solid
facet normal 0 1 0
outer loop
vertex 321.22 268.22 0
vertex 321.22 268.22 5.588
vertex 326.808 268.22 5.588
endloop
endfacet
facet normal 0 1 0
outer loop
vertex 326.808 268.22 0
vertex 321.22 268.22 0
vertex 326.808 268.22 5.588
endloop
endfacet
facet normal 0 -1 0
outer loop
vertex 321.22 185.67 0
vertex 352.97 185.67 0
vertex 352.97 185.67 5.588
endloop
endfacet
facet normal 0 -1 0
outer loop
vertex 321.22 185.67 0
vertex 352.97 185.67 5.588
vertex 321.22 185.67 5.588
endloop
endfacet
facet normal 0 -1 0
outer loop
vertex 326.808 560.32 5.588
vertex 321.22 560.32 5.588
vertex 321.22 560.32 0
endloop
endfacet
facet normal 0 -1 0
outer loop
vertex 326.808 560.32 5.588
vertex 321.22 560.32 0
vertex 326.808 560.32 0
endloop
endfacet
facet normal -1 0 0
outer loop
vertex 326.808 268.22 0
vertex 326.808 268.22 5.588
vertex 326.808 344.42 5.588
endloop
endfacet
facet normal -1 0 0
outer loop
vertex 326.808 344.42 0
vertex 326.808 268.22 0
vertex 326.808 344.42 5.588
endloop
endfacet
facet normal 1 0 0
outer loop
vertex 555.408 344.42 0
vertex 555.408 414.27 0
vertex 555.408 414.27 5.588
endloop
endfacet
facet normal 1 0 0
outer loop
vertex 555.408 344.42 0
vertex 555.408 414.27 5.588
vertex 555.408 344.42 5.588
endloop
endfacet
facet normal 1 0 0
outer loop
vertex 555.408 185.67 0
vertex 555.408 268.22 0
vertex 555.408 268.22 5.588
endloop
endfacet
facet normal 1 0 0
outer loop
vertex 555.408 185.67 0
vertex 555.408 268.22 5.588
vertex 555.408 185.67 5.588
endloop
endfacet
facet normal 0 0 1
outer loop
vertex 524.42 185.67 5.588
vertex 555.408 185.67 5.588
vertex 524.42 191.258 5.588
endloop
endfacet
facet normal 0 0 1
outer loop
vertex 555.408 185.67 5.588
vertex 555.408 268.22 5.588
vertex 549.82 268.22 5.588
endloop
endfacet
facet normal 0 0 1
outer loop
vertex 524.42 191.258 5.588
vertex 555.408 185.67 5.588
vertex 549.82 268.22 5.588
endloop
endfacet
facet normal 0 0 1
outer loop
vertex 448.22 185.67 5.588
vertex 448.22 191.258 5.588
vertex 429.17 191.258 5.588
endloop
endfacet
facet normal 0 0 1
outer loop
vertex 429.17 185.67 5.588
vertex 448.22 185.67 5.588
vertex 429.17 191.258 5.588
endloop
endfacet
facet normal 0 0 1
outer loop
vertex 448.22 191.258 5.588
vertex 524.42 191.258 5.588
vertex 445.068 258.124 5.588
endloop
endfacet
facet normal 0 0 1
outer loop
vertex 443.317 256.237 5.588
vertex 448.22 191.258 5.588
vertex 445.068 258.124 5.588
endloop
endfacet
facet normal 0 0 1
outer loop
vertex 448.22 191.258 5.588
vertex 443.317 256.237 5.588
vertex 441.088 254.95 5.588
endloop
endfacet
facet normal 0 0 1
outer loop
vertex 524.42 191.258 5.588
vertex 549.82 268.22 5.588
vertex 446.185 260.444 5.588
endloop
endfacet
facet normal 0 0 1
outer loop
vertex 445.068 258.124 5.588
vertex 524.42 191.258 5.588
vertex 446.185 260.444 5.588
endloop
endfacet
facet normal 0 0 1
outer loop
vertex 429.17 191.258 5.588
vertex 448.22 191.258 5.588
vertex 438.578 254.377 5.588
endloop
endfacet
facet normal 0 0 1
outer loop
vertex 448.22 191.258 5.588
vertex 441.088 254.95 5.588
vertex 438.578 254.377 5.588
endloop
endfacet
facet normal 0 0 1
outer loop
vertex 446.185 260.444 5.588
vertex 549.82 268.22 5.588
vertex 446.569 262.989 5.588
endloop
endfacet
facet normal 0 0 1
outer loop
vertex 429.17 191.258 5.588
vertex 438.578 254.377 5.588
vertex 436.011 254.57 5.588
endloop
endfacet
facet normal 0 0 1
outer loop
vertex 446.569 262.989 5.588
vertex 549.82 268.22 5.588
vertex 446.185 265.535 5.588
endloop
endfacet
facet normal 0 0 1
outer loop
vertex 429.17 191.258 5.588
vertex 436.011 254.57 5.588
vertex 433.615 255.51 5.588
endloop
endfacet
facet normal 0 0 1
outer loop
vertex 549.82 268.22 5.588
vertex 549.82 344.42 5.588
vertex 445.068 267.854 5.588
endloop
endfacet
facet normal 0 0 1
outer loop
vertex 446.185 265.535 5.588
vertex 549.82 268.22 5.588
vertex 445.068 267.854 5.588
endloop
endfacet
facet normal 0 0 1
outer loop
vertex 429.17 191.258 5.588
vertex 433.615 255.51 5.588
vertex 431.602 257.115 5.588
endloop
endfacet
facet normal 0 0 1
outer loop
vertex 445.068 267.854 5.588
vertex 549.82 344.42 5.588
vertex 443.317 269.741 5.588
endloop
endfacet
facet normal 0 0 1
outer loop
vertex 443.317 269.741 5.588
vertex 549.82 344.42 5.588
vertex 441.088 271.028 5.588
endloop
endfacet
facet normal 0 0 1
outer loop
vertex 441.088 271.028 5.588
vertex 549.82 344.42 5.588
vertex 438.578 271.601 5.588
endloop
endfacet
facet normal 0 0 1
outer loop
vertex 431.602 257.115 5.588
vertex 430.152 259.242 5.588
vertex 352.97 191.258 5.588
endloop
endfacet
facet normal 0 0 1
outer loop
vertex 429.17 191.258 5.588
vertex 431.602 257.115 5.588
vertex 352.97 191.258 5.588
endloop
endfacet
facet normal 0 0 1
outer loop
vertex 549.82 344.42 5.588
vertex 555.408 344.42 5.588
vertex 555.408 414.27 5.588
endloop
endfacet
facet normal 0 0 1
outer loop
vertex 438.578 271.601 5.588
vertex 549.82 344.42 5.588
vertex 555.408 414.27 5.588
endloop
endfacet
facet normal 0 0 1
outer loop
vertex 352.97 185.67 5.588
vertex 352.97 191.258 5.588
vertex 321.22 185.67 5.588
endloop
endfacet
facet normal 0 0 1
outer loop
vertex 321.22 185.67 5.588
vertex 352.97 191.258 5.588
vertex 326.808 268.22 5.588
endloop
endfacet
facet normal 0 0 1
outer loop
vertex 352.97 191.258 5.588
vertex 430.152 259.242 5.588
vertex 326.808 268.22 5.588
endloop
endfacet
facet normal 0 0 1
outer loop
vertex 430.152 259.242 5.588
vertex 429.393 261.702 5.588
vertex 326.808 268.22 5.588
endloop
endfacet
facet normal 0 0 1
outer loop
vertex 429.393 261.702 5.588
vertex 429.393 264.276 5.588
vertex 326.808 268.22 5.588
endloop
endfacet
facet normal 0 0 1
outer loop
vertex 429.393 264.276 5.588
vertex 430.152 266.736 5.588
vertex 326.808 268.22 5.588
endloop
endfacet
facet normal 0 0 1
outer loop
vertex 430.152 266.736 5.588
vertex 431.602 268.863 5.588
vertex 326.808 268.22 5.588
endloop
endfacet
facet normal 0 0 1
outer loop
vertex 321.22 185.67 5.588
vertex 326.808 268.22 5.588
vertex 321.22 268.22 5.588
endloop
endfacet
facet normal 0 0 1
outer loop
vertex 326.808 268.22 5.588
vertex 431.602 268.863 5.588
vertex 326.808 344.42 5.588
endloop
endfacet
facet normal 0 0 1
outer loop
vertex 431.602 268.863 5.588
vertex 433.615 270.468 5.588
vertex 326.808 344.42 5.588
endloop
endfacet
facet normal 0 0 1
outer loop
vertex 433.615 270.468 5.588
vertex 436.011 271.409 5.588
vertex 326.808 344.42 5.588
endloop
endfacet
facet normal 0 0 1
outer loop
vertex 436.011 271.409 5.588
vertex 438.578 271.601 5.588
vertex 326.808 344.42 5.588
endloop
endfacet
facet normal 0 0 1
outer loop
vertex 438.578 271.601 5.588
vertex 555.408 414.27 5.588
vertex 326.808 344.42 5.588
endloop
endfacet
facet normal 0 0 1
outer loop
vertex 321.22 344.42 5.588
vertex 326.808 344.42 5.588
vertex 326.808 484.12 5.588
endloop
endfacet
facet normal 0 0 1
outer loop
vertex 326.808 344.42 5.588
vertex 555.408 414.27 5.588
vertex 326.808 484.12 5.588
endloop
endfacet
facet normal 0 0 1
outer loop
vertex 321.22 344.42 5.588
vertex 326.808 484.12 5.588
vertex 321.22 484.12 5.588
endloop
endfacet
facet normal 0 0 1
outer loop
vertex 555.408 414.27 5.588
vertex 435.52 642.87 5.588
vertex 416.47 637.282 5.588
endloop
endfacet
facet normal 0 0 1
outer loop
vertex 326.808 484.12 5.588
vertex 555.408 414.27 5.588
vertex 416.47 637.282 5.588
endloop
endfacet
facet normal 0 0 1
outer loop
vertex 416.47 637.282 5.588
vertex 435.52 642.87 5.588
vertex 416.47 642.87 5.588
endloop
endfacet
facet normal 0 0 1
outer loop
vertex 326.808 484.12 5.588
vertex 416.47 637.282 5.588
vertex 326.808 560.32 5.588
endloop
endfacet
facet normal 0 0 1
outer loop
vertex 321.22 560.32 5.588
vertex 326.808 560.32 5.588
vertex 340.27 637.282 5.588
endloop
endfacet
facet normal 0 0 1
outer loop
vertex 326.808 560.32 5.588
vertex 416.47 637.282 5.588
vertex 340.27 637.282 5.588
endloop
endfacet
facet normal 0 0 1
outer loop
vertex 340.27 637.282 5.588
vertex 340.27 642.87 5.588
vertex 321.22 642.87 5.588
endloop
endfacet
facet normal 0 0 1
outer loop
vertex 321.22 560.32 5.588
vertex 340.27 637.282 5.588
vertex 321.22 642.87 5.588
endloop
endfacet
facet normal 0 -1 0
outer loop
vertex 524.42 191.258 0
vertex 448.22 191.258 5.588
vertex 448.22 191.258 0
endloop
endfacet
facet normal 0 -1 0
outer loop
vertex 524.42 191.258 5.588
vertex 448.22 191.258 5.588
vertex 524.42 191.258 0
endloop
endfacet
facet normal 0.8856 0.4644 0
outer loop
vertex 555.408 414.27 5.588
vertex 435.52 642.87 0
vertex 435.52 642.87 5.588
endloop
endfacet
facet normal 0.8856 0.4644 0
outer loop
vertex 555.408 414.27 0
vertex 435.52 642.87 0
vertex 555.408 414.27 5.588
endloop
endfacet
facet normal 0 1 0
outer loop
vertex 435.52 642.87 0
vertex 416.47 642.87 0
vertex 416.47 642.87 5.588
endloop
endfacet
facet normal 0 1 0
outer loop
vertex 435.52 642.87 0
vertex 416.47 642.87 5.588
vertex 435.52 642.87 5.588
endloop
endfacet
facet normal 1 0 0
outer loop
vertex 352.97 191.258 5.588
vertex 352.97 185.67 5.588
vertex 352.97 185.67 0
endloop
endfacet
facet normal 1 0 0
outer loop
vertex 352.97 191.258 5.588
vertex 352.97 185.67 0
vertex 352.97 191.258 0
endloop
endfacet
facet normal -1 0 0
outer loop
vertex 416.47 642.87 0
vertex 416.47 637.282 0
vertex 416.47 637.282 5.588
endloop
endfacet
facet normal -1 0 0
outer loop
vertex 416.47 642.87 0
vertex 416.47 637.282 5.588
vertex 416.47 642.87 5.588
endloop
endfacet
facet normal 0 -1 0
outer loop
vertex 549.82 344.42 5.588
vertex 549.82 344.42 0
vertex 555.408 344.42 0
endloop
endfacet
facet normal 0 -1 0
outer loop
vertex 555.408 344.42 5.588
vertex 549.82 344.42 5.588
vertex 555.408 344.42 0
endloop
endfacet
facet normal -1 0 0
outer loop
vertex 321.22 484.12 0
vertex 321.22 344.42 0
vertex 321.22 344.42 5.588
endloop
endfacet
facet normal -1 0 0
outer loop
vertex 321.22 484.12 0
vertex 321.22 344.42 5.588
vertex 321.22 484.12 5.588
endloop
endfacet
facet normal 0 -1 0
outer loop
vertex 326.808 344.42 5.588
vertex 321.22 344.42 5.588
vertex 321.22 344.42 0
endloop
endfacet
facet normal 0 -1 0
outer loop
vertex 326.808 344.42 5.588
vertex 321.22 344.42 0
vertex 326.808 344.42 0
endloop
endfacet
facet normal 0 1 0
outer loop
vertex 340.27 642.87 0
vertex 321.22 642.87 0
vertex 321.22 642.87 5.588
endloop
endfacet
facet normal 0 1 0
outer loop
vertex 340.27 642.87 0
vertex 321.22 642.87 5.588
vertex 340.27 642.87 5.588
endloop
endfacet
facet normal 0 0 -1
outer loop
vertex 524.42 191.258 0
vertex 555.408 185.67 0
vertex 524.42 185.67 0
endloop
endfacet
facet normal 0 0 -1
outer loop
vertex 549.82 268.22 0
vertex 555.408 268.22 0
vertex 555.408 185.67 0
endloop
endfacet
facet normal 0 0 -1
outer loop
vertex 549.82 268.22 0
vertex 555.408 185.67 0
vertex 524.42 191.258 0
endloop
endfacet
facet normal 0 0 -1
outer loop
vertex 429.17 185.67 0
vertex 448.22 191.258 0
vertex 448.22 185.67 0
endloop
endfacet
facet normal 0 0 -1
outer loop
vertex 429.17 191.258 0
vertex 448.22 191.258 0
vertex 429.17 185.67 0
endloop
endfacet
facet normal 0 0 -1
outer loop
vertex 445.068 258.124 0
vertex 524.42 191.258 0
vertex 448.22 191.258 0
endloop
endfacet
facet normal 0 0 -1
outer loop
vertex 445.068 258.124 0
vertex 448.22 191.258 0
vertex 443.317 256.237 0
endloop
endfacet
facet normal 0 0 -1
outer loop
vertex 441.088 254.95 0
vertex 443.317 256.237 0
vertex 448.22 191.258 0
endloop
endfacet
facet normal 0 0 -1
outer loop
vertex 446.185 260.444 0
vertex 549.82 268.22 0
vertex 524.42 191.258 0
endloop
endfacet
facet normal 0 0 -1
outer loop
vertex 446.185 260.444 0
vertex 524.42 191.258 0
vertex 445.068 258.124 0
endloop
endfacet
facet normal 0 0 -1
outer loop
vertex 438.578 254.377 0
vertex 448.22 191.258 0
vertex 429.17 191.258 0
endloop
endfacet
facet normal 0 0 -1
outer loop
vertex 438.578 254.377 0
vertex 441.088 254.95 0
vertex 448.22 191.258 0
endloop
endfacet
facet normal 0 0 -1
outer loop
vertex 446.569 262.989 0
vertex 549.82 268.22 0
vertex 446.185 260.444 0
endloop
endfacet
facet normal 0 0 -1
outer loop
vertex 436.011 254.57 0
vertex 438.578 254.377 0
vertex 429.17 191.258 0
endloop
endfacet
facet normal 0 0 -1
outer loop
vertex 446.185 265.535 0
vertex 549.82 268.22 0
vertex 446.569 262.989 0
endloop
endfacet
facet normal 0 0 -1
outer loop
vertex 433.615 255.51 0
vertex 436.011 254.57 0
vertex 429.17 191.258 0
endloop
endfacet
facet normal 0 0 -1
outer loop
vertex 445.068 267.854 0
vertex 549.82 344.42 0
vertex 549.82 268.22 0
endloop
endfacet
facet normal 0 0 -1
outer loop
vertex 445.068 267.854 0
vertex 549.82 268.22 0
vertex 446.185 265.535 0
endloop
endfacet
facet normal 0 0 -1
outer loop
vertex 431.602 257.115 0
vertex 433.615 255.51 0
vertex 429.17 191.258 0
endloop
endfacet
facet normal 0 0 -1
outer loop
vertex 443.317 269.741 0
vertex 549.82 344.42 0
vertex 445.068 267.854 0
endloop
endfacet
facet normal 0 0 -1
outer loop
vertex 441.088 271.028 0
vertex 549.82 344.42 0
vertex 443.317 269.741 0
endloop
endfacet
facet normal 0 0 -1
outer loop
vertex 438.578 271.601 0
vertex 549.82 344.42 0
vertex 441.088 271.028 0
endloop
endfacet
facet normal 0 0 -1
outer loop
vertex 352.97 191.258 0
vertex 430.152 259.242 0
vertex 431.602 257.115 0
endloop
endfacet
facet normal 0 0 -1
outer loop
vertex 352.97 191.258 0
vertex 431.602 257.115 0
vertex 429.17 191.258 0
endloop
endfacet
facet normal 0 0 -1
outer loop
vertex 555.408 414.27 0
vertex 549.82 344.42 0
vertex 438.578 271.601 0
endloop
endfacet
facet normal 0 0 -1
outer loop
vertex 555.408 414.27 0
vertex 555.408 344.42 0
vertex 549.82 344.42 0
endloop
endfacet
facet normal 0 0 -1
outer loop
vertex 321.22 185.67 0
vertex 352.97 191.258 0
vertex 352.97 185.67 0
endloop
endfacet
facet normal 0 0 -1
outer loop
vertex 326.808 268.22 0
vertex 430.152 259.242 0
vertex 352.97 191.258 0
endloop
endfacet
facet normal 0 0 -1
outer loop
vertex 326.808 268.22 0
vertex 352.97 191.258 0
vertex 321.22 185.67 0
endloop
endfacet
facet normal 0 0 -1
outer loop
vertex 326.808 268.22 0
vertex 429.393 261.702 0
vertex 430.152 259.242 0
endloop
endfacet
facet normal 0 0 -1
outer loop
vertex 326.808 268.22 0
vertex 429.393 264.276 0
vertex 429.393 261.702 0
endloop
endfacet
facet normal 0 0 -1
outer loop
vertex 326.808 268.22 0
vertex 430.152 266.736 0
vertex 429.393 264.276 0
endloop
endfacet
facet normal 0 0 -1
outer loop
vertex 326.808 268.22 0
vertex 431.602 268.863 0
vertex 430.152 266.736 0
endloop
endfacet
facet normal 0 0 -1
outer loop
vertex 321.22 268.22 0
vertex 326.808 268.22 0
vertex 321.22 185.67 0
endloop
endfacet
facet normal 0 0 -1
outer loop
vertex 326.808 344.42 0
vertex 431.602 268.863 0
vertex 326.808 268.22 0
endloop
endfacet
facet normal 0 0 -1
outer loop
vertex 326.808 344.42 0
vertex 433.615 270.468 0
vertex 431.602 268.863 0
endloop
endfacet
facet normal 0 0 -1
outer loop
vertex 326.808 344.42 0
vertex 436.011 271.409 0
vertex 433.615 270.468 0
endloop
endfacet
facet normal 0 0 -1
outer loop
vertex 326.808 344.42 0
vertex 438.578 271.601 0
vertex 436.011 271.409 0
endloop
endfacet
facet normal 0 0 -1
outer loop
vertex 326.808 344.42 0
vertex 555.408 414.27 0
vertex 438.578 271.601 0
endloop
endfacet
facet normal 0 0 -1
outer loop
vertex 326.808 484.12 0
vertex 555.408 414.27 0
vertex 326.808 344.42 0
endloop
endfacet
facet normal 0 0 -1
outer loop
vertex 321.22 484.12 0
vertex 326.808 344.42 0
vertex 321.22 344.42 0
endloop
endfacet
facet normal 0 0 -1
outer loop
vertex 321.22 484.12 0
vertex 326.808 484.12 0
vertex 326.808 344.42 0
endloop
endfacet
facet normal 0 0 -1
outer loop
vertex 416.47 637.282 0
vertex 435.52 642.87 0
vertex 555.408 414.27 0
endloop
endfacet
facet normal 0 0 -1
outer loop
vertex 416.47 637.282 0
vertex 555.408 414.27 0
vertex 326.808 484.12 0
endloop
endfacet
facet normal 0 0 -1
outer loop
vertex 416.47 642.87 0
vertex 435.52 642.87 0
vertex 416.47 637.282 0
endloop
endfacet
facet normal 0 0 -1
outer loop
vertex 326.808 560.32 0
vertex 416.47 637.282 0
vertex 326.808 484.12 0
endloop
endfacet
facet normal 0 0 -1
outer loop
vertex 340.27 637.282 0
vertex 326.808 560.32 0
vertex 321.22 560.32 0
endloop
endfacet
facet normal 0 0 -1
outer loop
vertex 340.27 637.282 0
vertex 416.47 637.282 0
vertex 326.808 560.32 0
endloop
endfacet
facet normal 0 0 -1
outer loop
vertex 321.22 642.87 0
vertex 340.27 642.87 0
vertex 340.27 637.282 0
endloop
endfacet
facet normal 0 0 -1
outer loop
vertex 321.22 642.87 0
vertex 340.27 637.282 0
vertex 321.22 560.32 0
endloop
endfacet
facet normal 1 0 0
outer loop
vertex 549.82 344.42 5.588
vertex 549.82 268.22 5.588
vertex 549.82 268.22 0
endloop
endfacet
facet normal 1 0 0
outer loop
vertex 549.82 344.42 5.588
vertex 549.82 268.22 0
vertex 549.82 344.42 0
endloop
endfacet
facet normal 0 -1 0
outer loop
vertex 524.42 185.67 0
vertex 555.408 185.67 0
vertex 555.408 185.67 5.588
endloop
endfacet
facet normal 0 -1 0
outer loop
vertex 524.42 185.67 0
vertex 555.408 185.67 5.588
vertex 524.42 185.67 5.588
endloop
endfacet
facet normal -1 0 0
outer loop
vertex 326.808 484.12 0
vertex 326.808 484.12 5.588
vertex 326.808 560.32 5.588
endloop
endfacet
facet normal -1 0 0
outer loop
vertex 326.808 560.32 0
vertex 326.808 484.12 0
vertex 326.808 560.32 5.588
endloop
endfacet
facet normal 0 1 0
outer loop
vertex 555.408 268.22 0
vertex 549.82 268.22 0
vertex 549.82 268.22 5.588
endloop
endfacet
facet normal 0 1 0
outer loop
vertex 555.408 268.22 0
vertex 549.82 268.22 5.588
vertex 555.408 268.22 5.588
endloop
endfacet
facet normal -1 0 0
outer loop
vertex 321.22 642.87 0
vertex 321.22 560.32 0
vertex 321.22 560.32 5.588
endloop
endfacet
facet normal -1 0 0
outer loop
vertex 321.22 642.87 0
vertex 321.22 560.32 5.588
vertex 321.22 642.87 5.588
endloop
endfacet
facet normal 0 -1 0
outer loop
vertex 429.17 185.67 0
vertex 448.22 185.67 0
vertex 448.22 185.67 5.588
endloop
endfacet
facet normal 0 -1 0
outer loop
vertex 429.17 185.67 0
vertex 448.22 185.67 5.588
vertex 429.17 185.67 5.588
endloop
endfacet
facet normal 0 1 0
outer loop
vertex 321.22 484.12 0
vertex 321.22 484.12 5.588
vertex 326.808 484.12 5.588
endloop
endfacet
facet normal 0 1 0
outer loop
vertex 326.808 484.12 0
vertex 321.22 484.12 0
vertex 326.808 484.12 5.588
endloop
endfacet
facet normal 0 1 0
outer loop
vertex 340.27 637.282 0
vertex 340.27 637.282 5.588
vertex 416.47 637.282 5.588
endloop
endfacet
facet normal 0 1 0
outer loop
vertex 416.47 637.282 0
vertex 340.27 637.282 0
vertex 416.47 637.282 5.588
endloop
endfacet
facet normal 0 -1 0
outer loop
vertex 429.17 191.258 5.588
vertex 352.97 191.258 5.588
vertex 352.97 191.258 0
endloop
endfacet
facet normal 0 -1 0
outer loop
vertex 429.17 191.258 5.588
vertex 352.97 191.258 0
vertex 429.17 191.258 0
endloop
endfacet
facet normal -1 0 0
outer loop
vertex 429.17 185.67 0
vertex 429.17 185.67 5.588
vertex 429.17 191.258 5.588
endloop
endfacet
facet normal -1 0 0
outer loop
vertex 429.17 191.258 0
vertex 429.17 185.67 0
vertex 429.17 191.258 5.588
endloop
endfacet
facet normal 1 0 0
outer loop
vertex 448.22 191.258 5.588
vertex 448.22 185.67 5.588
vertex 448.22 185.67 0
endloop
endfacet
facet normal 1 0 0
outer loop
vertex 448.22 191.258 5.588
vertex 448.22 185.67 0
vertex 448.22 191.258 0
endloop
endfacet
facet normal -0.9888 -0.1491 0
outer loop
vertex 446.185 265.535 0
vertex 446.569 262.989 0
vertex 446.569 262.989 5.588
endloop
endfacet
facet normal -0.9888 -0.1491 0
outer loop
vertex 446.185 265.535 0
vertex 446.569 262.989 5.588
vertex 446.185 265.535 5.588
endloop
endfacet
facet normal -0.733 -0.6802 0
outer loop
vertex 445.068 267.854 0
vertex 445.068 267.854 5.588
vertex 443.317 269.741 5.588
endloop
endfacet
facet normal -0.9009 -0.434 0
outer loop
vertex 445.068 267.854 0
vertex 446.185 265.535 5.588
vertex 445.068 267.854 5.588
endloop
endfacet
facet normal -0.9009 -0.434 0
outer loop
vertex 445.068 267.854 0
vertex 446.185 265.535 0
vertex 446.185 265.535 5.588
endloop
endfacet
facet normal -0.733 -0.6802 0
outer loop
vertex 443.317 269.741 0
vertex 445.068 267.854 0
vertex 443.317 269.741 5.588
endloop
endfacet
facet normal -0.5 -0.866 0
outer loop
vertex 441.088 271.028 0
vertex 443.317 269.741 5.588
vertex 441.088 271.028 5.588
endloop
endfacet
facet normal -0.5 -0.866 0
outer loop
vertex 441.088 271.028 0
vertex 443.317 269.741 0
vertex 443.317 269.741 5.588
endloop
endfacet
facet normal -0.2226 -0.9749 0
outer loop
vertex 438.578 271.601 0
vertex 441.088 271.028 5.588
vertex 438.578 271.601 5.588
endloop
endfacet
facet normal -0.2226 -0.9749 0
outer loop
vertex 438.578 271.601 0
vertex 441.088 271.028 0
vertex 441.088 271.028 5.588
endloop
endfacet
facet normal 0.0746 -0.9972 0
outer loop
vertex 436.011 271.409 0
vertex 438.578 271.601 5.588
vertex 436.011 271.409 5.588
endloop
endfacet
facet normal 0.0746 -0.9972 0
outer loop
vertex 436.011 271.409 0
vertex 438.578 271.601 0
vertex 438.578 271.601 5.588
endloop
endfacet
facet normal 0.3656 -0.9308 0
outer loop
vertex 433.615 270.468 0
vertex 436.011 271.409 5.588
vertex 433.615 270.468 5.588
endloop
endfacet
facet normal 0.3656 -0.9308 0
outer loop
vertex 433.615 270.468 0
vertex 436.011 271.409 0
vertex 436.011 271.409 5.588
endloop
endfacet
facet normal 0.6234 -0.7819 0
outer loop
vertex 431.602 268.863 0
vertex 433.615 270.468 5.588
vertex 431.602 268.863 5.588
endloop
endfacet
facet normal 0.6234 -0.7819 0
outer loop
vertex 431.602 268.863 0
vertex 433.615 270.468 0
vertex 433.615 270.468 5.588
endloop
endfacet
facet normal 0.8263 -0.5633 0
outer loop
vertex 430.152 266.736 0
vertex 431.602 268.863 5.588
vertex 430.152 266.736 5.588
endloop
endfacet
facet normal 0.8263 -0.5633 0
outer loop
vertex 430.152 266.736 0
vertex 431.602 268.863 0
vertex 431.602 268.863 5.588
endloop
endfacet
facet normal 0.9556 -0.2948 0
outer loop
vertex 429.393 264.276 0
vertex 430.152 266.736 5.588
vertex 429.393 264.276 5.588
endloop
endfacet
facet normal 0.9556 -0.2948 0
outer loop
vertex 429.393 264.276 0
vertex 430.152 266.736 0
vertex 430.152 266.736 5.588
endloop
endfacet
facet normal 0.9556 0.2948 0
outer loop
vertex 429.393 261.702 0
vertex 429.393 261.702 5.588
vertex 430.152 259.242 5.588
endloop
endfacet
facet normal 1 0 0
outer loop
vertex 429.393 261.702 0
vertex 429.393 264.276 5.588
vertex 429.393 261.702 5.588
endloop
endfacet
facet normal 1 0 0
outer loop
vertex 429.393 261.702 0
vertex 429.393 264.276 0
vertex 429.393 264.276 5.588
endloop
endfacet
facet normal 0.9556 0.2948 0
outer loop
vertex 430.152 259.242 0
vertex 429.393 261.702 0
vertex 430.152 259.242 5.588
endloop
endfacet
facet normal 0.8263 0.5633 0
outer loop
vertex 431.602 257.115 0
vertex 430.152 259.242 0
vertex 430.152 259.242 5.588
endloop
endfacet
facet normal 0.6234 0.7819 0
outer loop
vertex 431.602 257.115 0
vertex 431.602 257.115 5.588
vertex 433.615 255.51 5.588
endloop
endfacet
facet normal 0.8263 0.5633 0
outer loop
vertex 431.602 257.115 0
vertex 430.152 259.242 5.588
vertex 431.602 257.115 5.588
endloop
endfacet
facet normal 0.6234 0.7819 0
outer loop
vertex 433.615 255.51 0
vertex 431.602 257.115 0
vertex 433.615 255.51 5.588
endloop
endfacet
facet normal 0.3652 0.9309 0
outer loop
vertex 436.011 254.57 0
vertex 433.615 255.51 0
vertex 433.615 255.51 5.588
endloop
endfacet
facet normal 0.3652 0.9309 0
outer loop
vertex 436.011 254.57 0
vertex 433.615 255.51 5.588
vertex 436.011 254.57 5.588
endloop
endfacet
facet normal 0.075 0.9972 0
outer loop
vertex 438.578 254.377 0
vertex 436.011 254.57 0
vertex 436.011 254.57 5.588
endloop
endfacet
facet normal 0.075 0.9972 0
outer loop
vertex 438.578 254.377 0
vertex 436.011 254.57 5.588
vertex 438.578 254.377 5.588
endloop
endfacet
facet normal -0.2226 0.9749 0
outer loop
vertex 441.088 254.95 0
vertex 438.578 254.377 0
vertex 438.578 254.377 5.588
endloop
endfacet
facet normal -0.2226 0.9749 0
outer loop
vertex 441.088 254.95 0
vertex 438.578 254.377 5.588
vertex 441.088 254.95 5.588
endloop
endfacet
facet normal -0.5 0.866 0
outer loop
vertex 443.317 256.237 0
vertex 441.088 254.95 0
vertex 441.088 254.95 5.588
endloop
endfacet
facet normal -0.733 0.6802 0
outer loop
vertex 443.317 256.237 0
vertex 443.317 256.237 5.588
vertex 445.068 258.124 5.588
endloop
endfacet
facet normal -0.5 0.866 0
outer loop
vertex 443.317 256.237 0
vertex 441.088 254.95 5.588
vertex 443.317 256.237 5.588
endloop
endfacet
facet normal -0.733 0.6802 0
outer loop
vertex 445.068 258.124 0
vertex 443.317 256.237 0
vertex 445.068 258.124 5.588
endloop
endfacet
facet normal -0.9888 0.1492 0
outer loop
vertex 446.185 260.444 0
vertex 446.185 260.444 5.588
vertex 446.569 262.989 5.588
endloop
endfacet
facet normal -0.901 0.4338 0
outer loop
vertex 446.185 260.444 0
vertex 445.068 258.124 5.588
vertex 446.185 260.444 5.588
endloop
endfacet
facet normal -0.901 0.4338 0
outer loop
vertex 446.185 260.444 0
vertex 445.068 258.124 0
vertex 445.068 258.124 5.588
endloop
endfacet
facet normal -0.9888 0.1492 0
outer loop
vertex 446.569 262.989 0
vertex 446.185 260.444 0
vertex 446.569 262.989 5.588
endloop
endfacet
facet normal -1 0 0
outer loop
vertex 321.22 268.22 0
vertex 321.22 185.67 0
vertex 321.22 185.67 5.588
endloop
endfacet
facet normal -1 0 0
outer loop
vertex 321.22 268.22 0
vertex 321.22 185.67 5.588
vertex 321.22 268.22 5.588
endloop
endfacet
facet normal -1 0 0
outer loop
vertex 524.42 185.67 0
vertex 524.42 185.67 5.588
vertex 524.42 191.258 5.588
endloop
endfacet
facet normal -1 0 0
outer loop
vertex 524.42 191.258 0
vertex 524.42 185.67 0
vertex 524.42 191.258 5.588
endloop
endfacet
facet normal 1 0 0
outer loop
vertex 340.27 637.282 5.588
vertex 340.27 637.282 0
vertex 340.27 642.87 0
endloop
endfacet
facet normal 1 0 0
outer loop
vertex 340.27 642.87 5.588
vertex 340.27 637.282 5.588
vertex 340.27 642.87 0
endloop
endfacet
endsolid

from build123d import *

# Parameters (mm, degrees)
BOSS_EXTRUDE3_DEPTH     = 5.588
SKETCH2_W               = 76.2
SKETCH2_H               = 5.588
SKETCH2_W_2             = 5.588
SKETCH2_H_2             = 76.2
CUT_EXTRUDE1_DEPTH      = 850.582717671
CUT_EXTRUDE3_DEPTH      = 850.582717671
CUT_EXTRUDE3_DEPTH_BACK = 850.582717671
SKETCH3_R               = 8.636


with BuildPart() as part:
    # Sketch1 → Boss-Extrude3 (new body)
    with BuildSketch(Plane.XY):
        Polygon((435.519883673, 642.86985555), (555.407883673, 414.26985555), (555.407883673, 185.66985555), (321.219883673, 185.66985555), (321.219883673, 642.86985555), align=None)
    extrude(amount=BOSS_EXTRUDE3_DEPTH)

    # Sketch2 → Cut-Extrude1 (cut, through all)
    with BuildSketch(Plane.XY.offset(5.588)):
        with Locations((378.369883673, 640.07585555)):
            Rectangle(SKETCH2_W, SKETCH2_H)
        with Locations((324.013883673, 522.21985555)):
            Rectangle(SKETCH2_W_2, SKETCH2_H_2)
        with Locations((324.013883673, 306.31985555)):
            Rectangle(SKETCH2_W_2, SKETCH2_H_2)
        with Locations((391.069883673, 188.46385555)):
            Rectangle(SKETCH2_W, SKETCH2_H)
        with Locations((486.319883673, 188.46385555)):
            Rectangle(SKETCH2_W, SKETCH2_H)
        with Locations((552.613883673, 306.31985555)):
            Rectangle(SKETCH2_W_2, SKETCH2_H_2)
    extrude(amount=-CUT_EXTRUDE1_DEPTH, mode=Mode.SUBTRACT)

    # Sketch3 → Cut-Extrude3 (cut, two sides: drawn at the far end of the back side and taken through both)
    with BuildSketch(Plane.XY.offset(-CUT_EXTRUDE3_DEPTH_BACK)):
        with Locations((437.932883673, 262.989065336)):
            Circle(SKETCH3_R)
    extrude(amount=CUT_EXTRUDE3_DEPTH + CUT_EXTRUDE3_DEPTH_BACK, mode=Mode.SUBTRACT)


solid = part.part
